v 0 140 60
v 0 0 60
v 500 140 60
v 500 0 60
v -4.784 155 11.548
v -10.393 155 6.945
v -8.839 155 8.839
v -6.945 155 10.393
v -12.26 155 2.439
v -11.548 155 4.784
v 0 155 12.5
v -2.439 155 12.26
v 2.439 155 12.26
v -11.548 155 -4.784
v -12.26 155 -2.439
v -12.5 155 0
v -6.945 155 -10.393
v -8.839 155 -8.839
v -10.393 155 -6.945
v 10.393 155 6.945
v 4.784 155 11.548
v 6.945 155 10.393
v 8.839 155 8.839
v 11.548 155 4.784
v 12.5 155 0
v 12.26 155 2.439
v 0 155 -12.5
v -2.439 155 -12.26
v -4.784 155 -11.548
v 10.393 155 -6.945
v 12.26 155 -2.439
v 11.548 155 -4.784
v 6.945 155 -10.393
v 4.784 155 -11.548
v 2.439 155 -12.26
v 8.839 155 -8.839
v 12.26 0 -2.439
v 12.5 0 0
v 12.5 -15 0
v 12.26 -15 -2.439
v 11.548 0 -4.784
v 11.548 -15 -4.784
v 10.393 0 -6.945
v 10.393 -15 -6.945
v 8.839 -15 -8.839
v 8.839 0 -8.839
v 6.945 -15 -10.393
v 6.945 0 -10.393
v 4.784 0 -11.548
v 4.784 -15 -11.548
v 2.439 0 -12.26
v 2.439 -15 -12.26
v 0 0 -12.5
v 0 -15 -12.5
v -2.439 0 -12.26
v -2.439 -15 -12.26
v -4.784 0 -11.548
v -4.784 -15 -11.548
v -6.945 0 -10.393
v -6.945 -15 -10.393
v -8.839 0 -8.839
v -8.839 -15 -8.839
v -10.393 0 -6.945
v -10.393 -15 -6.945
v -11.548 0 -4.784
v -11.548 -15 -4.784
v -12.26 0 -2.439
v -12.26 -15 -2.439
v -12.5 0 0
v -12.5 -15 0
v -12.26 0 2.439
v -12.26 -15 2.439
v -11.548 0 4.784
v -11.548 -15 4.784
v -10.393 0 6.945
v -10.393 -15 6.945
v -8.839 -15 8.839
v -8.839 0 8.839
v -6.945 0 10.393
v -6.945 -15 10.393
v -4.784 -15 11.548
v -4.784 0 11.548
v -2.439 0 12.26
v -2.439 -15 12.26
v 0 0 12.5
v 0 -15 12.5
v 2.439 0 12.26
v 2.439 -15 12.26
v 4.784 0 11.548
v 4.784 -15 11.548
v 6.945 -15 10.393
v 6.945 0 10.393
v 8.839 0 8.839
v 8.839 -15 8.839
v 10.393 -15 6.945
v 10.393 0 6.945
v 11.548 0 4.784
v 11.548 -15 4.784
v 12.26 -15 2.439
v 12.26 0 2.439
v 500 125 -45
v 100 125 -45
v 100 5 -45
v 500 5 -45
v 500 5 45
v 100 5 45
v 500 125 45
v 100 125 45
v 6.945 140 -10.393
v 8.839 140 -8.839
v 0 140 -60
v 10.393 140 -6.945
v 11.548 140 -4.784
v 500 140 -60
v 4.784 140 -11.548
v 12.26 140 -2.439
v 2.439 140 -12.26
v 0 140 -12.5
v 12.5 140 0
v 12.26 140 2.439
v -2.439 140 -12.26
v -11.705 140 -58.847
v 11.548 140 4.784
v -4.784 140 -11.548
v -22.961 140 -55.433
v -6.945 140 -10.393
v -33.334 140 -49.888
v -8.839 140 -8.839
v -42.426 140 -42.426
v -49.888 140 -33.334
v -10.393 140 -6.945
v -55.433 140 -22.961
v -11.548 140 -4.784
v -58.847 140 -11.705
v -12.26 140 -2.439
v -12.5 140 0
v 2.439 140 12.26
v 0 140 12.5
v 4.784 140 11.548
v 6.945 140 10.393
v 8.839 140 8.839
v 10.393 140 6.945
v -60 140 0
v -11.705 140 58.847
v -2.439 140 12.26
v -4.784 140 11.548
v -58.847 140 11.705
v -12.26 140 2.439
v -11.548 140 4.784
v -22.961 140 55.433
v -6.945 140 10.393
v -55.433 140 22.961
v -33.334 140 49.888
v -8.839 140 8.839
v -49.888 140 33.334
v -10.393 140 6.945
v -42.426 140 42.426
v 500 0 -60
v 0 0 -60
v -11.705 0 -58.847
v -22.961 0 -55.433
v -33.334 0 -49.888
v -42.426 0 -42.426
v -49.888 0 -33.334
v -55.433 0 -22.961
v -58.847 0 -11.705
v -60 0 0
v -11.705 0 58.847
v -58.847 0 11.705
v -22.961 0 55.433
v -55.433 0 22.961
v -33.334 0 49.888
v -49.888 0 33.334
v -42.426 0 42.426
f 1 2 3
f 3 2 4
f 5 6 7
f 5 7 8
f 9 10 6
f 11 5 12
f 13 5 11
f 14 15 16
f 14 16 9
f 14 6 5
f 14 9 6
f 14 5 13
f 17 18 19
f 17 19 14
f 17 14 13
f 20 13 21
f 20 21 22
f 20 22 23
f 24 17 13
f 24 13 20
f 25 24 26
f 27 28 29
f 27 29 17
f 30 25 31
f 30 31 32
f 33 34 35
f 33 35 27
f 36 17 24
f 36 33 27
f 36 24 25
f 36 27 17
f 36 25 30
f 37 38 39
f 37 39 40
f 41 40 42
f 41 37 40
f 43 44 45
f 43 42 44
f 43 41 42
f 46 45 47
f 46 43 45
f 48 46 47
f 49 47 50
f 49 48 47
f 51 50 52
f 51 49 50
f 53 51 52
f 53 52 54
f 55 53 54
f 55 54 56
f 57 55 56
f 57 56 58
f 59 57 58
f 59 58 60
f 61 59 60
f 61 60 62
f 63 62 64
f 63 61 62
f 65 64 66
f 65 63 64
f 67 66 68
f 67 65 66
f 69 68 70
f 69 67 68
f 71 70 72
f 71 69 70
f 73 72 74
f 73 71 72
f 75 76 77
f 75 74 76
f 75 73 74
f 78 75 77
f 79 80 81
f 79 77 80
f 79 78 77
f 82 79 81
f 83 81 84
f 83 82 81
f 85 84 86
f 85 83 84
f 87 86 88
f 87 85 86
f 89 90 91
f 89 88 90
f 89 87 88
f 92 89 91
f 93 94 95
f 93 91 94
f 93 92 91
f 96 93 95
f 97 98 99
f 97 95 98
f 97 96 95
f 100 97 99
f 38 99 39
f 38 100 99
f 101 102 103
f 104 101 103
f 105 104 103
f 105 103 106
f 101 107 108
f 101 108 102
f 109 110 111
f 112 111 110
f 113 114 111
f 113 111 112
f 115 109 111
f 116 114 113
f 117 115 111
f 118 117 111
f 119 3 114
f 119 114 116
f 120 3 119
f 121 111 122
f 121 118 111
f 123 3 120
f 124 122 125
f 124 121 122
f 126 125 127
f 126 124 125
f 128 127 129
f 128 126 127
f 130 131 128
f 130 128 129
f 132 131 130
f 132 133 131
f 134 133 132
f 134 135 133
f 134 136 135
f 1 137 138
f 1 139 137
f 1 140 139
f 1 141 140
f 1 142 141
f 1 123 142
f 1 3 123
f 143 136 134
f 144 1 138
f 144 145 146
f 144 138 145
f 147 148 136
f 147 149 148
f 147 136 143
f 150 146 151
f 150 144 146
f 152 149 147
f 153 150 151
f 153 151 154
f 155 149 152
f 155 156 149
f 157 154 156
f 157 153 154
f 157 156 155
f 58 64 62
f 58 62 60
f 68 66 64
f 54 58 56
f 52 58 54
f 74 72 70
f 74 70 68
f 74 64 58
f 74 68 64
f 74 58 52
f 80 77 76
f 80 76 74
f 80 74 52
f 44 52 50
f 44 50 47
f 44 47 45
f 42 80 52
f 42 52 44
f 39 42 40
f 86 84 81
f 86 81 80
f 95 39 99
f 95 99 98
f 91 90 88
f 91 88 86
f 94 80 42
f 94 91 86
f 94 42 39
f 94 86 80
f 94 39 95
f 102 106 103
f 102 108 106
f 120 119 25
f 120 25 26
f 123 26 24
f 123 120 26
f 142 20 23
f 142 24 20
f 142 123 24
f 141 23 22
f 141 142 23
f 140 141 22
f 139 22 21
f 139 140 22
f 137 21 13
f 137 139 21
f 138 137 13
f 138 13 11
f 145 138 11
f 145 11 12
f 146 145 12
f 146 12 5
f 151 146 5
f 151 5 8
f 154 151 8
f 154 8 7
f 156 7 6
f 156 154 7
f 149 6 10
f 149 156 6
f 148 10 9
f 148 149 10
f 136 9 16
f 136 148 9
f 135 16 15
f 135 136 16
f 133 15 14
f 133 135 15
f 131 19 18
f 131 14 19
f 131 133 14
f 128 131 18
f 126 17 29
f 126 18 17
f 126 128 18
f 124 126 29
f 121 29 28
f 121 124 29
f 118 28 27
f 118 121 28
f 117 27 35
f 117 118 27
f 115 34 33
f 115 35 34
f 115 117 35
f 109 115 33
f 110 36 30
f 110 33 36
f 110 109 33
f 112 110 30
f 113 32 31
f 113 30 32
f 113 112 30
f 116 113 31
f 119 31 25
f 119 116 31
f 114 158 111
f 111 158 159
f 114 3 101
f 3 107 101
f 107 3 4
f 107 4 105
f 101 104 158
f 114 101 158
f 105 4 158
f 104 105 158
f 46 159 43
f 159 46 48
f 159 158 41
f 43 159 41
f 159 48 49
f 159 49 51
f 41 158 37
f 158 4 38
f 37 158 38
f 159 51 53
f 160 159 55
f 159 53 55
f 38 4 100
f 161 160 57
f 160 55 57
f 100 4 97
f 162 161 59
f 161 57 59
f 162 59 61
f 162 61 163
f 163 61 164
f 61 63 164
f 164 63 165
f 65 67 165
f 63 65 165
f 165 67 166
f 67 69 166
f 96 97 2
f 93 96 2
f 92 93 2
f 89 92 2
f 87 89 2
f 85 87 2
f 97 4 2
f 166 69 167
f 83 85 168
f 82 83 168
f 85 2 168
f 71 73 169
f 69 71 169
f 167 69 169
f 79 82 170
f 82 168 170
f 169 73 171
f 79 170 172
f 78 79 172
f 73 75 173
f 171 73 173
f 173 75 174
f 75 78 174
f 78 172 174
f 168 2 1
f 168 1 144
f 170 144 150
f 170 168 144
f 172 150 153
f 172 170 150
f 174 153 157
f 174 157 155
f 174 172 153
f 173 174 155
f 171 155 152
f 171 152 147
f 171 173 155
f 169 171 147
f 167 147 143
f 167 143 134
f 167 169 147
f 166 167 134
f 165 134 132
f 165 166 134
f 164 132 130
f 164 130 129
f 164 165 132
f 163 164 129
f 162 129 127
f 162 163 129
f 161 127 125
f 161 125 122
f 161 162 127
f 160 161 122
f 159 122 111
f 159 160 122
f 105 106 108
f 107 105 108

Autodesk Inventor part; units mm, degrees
ref_plane "YZ Plane" through (0, 0, 0) normal (1, 0, 0) x (0, 1, 0)
ref_plane "XZ Plane" through (0, 0, 0) normal (0, 1, 0) x (-1, 0, 0)
ref_plane "XY Plane" through (0, 0, 0) normal (0, 0, 1) x (1, 0, 0)
sketch "Szkic1" plane through (0, 0, 0) normal (0, 1, 0) x (-1, 0, 0)
  circle A0 centre (0, 0) radius 60
  line L0 (0, 60) -> (-500, 60)
  line L1 (-500, 60) -> (-500, -60)
  line L2 (-500, -60) -> (0, -60)
  line L3 (0, -60) -> (0, 60)
  point P0 (0, -60)
  dimension "d0" = 120
  dimension "d1" = 500
  dimension "d2" = 120
extrude "Wyciągnięcie proste1" add sketch "Szkic1" along normal blind 140
sketch "Szkic2" plane through (0, 140, 0) normal (0, 1, 0) x (1, 0, 0)
  circle A0 centre (0, 0) radius 12.5
  dimension "d5" = 25
extrude "Wyciągnięcie proste2" add sketch "Szkic2" along normal blind 15
sketch "Szkic3" plane through (0, 0, 0) normal (0, -1, 0) x (1, 0, 0)
  circle A0 centre (0, 0) radius 12.5
  dimension "d8" = 25
extrude "Wyciągnięcie proste3" add sketch "Szkic3" along normal blind 15
sketch "Szkic4" plane through (500, 0, 60) normal (1, 0, 0) x (0, 0, -1)
  line L0 (0, 0) -> (0, 140) projected
  line L1 (0, 140) -> (120, 140) projected
  line L2 (120, 0) -> (120, 140) projected
  line L3 (0, 0) -> (120, 0) projected
  line L4 (15, 125) -> (105, 125)
  line L5 (105, 125) -> (105, 5)
  line L6 (105, 5) -> (15, 5)
  line L7 (15, 5) -> (15, 125)
  line L8 (15, 125) -> (105, 5) construction
  line L9 (105, 125) -> (15, 5) construction
  point P0 (60, 0)
  point P1 (60, 65)
  dimension "d11" = 90
  dimension "d12" = 120
  dimension "d13" = 15
  dimension "d14" = 15
extrude "Wyciągnięcie proste4" cut sketch "Szkic4" against normal blind 400 contours L4 L5 L6 L7
equation "\"PromieńGięcia\" = Grubość"
equation "\"SzerokośćGięciaPodcięcia\" = Grubość"
equation "\"GłębokośćGięciaPodcięcia\" = 0.5 * Grubość"
equation "\"RozmiarPodcięciaNarożnika\" = 4 * Grubość"
equation "\"MinimalnaPozostałość\" = 2 * Grubość"
equation "\"PromieńPrzejścia\" = PromieńGięcia"
equation "\"Rozmiar_promienia_Jacobiego\" = PromieńGięcia"
equation "\"Wielk_odstępu\" = Grubość"
equation "\"Grubość\" = 0.5"
properties part number "czesc2"
